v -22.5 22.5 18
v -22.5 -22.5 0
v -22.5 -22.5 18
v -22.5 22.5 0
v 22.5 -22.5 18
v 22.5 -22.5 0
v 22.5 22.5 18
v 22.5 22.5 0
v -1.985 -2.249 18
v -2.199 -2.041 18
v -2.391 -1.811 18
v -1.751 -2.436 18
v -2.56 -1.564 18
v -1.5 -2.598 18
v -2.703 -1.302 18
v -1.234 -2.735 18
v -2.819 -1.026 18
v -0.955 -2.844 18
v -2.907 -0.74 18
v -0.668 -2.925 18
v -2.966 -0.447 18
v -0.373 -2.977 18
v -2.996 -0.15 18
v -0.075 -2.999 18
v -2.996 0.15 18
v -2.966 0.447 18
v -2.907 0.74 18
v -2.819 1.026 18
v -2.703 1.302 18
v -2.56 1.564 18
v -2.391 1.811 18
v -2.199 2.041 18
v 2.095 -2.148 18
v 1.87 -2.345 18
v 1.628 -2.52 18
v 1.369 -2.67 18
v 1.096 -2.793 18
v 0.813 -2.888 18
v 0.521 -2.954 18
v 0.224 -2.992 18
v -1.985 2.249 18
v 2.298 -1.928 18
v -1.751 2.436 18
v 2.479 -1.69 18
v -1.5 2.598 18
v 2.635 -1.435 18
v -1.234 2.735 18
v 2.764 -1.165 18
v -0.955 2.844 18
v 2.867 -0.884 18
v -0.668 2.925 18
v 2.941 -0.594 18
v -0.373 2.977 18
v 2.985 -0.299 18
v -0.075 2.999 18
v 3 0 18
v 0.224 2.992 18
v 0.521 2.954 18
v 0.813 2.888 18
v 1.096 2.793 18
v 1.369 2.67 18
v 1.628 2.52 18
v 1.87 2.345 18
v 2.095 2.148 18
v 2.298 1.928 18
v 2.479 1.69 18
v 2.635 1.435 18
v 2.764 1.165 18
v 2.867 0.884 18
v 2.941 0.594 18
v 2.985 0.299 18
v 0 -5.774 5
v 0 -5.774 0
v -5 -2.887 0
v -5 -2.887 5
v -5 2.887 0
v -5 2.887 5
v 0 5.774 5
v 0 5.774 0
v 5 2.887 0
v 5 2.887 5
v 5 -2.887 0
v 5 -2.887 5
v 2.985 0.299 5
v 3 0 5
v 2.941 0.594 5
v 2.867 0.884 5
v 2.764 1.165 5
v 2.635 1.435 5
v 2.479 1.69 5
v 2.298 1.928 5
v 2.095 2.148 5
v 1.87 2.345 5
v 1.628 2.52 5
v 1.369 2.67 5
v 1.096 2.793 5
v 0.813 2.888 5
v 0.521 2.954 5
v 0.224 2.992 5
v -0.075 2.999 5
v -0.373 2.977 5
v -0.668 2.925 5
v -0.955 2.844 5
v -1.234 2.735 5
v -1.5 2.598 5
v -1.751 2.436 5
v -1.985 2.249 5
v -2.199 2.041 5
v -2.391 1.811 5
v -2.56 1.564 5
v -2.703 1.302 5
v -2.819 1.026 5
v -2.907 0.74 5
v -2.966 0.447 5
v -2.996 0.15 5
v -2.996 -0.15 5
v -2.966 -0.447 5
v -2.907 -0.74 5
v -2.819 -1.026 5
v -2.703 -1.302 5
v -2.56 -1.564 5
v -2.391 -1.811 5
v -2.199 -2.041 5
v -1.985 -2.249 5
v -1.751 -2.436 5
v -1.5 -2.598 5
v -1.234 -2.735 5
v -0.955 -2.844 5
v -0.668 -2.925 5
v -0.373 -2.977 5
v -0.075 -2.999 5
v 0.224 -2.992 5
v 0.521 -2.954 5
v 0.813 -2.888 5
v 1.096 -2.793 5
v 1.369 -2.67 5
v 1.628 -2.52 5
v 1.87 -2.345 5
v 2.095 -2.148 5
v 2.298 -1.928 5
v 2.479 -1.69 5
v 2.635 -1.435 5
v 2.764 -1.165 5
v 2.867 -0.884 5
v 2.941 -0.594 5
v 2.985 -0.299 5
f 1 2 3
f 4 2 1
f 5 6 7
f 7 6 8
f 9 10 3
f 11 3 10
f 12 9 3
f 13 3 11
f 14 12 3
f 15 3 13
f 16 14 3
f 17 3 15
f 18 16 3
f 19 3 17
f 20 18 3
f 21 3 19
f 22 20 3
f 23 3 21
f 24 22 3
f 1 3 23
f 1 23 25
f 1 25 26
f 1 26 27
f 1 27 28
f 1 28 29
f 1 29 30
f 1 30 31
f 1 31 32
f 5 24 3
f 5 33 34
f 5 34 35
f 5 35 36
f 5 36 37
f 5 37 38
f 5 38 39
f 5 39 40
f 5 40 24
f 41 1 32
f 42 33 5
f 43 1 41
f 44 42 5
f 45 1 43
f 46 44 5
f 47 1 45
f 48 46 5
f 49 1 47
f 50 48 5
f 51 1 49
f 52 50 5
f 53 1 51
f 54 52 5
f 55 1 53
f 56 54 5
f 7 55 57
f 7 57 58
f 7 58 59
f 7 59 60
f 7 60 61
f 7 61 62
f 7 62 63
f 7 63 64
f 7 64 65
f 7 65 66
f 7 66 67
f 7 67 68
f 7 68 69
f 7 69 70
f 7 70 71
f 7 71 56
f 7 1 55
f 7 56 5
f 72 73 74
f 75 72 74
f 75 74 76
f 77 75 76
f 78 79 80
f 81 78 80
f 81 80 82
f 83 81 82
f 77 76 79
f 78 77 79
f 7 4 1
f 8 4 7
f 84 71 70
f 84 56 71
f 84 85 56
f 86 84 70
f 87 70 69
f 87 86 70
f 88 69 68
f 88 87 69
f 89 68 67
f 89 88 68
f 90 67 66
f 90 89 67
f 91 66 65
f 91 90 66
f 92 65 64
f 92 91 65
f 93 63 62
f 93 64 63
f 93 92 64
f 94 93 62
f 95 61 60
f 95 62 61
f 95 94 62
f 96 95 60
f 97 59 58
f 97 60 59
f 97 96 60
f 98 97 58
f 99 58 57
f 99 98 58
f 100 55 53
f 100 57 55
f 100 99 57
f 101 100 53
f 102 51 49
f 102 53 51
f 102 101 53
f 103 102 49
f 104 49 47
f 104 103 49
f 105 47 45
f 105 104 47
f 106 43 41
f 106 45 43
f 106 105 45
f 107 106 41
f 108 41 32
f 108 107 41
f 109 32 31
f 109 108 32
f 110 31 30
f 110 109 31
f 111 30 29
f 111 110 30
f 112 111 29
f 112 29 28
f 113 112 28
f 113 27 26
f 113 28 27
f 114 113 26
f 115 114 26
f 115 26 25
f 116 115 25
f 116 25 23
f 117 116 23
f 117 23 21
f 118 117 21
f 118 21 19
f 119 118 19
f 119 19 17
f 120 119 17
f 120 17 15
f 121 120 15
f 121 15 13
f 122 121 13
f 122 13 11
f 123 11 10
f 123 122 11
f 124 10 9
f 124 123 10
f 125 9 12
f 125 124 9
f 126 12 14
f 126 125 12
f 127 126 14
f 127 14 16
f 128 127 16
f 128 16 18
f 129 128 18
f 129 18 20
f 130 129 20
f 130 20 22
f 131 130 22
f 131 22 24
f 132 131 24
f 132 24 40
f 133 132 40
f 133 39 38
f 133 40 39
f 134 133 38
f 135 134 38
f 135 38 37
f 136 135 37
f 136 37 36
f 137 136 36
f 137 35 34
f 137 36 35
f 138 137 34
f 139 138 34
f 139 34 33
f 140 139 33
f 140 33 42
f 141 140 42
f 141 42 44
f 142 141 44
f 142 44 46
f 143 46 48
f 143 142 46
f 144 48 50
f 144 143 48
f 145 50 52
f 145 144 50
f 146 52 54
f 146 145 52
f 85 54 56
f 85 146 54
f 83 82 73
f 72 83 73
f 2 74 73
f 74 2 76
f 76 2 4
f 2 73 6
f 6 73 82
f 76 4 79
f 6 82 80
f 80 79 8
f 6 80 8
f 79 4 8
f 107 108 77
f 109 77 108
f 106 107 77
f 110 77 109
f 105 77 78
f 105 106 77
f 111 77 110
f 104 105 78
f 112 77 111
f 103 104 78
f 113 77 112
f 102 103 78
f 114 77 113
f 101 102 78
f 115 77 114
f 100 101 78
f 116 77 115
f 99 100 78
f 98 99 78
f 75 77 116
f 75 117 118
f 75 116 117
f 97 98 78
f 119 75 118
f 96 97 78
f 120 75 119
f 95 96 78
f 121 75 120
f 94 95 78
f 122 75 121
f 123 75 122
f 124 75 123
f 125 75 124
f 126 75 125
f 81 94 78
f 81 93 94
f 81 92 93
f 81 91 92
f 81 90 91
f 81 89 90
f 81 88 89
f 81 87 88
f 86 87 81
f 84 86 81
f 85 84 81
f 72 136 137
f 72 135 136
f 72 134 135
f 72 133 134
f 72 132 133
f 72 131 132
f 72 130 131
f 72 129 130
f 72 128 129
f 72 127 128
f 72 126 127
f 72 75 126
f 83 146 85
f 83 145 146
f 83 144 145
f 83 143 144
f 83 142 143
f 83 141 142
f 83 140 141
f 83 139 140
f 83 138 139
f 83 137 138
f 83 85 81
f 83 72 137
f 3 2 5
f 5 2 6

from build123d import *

# Parameters (mm, degrees)
F0_W     = 45
F0_H     = 45
F1_DEPTH = 18
F2_R     = 3
F3_DEPTH = 18.001
F6_DEPTH = 5


with BuildPart() as f1:
    # F0 (on Top) → F1 (new body)
    with BuildSketch(Plane.XY):
        Rectangle(F0_W, F0_H)
    extrude(amount=F1_DEPTH)

    # F2 (on Top) → F3 (cut, through all)
    with BuildSketch(Plane.XY):
        Circle(F2_R)
    extrude(amount=F3_DEPTH, mode=Mode.SUBTRACT)

    # F5 (on face) → F6 (cut)
    with BuildSketch(Plane(origin=(0, 0, 0), x_dir=(1, 0, 0), z_dir=(0, 0, -1))):
        Polygon((5, -2.886751), (5, 2.886751), (0, 5.773503), (-5, 2.886751), (-5, -2.886751), (0, -5.773503), align=None)
    extrude(amount=-F6_DEPTH, mode=Mode.SUBTRACT)


solid = f1.part
